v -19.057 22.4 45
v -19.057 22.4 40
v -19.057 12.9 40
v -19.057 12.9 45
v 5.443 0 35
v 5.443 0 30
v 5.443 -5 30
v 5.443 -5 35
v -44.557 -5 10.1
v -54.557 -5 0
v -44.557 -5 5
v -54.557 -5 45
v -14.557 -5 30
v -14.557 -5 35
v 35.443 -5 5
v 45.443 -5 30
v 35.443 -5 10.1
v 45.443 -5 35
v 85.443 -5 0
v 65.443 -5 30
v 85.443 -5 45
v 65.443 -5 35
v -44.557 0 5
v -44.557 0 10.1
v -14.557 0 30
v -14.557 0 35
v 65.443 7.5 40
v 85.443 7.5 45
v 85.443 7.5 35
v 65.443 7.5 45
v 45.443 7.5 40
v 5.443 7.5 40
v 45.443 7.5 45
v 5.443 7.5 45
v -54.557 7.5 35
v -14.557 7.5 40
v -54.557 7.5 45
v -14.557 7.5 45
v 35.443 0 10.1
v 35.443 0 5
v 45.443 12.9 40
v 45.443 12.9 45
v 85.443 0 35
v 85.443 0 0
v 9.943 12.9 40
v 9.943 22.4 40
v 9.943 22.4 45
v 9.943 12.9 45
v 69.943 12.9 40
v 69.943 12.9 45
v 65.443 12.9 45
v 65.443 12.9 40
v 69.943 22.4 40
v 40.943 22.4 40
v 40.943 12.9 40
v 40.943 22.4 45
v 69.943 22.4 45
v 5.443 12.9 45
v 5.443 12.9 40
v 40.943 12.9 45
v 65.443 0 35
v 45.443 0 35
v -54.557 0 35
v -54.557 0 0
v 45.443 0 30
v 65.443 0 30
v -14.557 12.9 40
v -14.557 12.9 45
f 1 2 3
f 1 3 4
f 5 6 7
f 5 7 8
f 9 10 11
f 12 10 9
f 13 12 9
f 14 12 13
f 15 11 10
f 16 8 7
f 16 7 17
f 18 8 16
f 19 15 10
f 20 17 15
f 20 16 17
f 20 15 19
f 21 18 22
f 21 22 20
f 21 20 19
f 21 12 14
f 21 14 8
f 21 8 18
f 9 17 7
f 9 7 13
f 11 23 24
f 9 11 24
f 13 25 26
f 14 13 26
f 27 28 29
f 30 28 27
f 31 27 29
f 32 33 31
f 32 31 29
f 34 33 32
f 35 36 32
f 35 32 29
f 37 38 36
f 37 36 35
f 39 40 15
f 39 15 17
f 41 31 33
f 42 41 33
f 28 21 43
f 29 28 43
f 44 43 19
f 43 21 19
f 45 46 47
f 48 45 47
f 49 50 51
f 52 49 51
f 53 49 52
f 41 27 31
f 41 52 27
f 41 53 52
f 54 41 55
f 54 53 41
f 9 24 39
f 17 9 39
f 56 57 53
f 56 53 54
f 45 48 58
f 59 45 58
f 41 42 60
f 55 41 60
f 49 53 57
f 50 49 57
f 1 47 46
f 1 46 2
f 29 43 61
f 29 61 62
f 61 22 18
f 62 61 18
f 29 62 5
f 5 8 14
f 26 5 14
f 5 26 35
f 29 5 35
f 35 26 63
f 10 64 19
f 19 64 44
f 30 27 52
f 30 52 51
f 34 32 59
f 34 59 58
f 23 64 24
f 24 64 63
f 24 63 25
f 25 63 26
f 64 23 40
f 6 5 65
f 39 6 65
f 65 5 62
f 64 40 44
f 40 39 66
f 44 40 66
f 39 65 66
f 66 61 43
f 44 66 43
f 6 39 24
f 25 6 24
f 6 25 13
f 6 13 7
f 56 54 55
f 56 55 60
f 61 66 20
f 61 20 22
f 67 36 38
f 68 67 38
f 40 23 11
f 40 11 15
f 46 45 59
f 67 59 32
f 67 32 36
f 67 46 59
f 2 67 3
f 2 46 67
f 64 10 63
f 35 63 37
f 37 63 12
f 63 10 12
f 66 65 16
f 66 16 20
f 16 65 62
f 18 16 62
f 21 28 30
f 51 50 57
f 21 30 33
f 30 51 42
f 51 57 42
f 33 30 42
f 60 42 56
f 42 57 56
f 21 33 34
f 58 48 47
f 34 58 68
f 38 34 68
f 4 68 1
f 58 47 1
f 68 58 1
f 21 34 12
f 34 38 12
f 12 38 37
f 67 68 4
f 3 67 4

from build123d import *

# Parameters (mm, degrees)
F0_W     = 80
F0_H     = 5.1
F0_W_2   = 20
F0_H_2   = 5
F1_DEPTH = 5
F2_W     = 20
F2_H     = 5
F2_W_2   = 40
F3_DEPTH = 7.5
F4_DEPTH = 22.4
F5_W     = 4.5
F5_H     = 5
F6_DEPTH = 9.5
F7_W     = 4.5
F7_H     = 5
F8_DEPTH = 9.5
F9_DEPTH = 7.5


with BuildPart() as f1:
    # F0 (on Front) → F1 (new body)
    with BuildSketch(Plane.XZ):
        Polygon((-54.556705, 45), (-54.556705, 0), (85.443295, 0), (85.443295, 45), (65.443295, 45), (65.443295, 40), (45.443295, 40), (45.443295, 45), (5.443295, 45), (5.443295, 40), (-14.556705, 40), (-14.556705, 45), align=None)
        with Locations((-4.556705, 7.55)):
            Rectangle(F0_W, F0_H, mode=Mode.SUBTRACT)
        with Locations((-4.556705, 32.5)):
            Rectangle(F0_W_2, F0_H_2, mode=Mode.SUBTRACT)
        with Locations((55.443295, 32.5)):
            Rectangle(F0_W_2, F0_H_2, mode=Mode.SUBTRACT)
        with Locations((55.443295, 42.5)):
            Rectangle(F0_W_2, F0_H_2)
        with Locations((-4.556705, 42.5)):
            Rectangle(F0_W_2, F0_H_2)
    extrude(amount=F1_DEPTH)

    # F2 (on face) → F3 (join)
    with BuildSketch(Plane(origin=(0, 0, 0), x_dir=(-1, 0, 0), z_dir=(0, 1, 0))):
        with Locations((-75.443295, 42.5)):
            Rectangle(F2_W, F2_H)
        with Locations((-25.443295, 42.5)):
            Rectangle(F2_W_2, F2_H)
        with Locations((34.556705, 42.5)):
            Rectangle(F2_W_2, F2_H)
    extrude(amount=F3_DEPTH)

    # F2 (on face) → F4 (join)
    with BuildSketch(Plane(origin=(0, 0, 0), x_dir=(-1, 0, 0), z_dir=(0, 1, 0))):
        with Locations((-55.443295, 42.5)):
            Rectangle(F2_W, F2_H)
        with Locations((4.556705, 42.5)):
            Rectangle(F2_W, F2_H)
    extrude(amount=F4_DEPTH)

    # F5 (on face) → F6 (join)
    with BuildSketch(Plane(origin=(0, 22.4, 0), x_dir=(-1, 0, 0), z_dir=(0, 1, 0))):
        with Locations((-67.693295, 42.5)):
            Rectangle(F5_W, F5_H)
        with Locations((-43.193295, 42.5)):
            Rectangle(F5_W, F5_H)
    extrude(amount=-F6_DEPTH)

    # F7 (on face) → F8 (join)
    with BuildSketch(Plane(origin=(0, 22.4, 0), x_dir=(-1, 0, 0), z_dir=(0, 1, 0))):
        with Locations((-7.693295, 42.5)):
            Rectangle(F7_W, F7_H)
        with Locations((16.806705, 42.5)):
            Rectangle(F7_W, F7_H)
    extrude(amount=-F8_DEPTH)

    # F2 (on face) → F9 (join)
    with BuildSketch(Plane(origin=(0, 0, 0), x_dir=(-1, 0, 0), z_dir=(0, 1, 0))):
        Polygon((14.556705, 40), (-5.443295, 40), (-45.443295, 40), (-65.443295, 40), (-85.443295, 40), (-85.443295, 35), (-65.443295, 35), (-45.443295, 35), (-5.443295, 35), (14.556705, 35), (54.556705, 35), (54.556705, 40), align=None)
    extrude(amount=F9_DEPTH)


solid = f1.part
